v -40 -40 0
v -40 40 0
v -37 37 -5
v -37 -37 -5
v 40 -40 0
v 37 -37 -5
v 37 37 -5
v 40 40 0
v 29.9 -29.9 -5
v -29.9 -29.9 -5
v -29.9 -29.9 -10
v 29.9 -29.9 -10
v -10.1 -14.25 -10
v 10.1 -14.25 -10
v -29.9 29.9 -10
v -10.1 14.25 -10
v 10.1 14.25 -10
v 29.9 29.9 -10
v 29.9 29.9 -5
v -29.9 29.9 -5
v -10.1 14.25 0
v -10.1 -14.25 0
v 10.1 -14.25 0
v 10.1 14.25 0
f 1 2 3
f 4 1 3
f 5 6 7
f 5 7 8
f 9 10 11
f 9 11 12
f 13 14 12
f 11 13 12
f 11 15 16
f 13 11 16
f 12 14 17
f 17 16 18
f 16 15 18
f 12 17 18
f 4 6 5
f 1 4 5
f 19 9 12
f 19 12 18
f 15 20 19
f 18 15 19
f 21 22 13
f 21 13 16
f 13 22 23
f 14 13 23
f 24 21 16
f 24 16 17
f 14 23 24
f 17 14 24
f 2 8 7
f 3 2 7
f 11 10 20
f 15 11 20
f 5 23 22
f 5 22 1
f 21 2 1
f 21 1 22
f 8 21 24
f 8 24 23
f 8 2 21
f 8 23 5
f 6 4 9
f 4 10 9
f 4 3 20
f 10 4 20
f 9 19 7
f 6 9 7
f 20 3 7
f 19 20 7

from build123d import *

# Parameters (mm, degrees)
CROQUIS1_W              = 59.8
CROQUIS1_H              = 59.8
CROQUIS1_W_2            = 20.2
CROQUIS1_H_2            = 28.5
SALIENTE_EXTRUIR1_DEPTH = 10
CROQUIS1_3_W            = 20.2
CROQUIS1_3_H            = 28.5
CORTAR_EXTRUIR1_DEPTH   = 10
CROQUIS1_4_W            = 80
CROQUIS1_4_H            = 80
CROQUIS1_4_W_2          = 59.8
CROQUIS1_4_H_2          = 59.8
SALIENTE_EXTRUIR2_DEPTH = 5
CHAFL_N2_START          = -40
CHAFL_N2_DEPTH          = 80
CHAFL_N2_START_2        = -41
CHAFL_N2_2_DEPTH        = 82


with BuildPart() as part:
    # Croquis1 → Saliente-Extruir1 (new body)
    # profile 1 of 2: a face of its own
    with BuildSketch(Plane.XY):
        Rectangle(CROQUIS1_W, CROQUIS1_H)
        Rectangle(CROQUIS1_W_2, CROQUIS1_H_2, mode=Mode.SUBTRACT)
    # profile 2 of 2: a face of its own
    with BuildSketch(Plane.XY):
        Rectangle(CROQUIS1_W_2, CROQUIS1_H_2)
    extrude(amount=-SALIENTE_EXTRUIR1_DEPTH)

    # Croquis1<3> → Cortar-Extruir1 (cut)
    with BuildSketch(Plane.XY):
        Rectangle(CROQUIS1_3_W, CROQUIS1_3_H)
    extrude(amount=-CORTAR_EXTRUIR1_DEPTH, mode=Mode.SUBTRACT)

    # Croquis1<4> → Saliente-Extruir2 (add)
    with BuildSketch(Plane.XY):
        Rectangle(CROQUIS1_4_W, CROQUIS1_4_H)
        Rectangle(CROQUIS1_4_W_2, CROQUIS1_4_H_2, mode=Mode.SUBTRACT)
    extrude(amount=-SALIENTE_EXTRUIR2_DEPTH)

    # Chaflán2: read off the stored shape, not the designer's step
    # Chaflán2 outline → Chaflán2 (cut)
    with BuildSketch(Plane(origin=(0, 0, 0), x_dir=(1, 0, 0), z_dir=(0, 1, 0)).offset(CHAFL_N2_START)):
        Polygon((-40, 5), (-40, 0), (-37, 5), align=None)
        Polygon((40, 5), (37, 5), (40, 0), align=None)
    extrude(amount=CHAFL_N2_DEPTH, mode=Mode.SUBTRACT)

    # Chafl_n2 2 outline → Chafl_n2 2 (cut)
    with BuildSketch(Plane.YZ.offset(CHAFL_N2_START_2)):
        Polygon((40, -5), (40, 0), (37, -5), align=None)
        Polygon((-40, -5), (-37, -5), (-40, 0), align=None)
    extrude(amount=CHAFL_N2_2_DEPTH, mode=Mode.SUBTRACT)


solid = part.part
